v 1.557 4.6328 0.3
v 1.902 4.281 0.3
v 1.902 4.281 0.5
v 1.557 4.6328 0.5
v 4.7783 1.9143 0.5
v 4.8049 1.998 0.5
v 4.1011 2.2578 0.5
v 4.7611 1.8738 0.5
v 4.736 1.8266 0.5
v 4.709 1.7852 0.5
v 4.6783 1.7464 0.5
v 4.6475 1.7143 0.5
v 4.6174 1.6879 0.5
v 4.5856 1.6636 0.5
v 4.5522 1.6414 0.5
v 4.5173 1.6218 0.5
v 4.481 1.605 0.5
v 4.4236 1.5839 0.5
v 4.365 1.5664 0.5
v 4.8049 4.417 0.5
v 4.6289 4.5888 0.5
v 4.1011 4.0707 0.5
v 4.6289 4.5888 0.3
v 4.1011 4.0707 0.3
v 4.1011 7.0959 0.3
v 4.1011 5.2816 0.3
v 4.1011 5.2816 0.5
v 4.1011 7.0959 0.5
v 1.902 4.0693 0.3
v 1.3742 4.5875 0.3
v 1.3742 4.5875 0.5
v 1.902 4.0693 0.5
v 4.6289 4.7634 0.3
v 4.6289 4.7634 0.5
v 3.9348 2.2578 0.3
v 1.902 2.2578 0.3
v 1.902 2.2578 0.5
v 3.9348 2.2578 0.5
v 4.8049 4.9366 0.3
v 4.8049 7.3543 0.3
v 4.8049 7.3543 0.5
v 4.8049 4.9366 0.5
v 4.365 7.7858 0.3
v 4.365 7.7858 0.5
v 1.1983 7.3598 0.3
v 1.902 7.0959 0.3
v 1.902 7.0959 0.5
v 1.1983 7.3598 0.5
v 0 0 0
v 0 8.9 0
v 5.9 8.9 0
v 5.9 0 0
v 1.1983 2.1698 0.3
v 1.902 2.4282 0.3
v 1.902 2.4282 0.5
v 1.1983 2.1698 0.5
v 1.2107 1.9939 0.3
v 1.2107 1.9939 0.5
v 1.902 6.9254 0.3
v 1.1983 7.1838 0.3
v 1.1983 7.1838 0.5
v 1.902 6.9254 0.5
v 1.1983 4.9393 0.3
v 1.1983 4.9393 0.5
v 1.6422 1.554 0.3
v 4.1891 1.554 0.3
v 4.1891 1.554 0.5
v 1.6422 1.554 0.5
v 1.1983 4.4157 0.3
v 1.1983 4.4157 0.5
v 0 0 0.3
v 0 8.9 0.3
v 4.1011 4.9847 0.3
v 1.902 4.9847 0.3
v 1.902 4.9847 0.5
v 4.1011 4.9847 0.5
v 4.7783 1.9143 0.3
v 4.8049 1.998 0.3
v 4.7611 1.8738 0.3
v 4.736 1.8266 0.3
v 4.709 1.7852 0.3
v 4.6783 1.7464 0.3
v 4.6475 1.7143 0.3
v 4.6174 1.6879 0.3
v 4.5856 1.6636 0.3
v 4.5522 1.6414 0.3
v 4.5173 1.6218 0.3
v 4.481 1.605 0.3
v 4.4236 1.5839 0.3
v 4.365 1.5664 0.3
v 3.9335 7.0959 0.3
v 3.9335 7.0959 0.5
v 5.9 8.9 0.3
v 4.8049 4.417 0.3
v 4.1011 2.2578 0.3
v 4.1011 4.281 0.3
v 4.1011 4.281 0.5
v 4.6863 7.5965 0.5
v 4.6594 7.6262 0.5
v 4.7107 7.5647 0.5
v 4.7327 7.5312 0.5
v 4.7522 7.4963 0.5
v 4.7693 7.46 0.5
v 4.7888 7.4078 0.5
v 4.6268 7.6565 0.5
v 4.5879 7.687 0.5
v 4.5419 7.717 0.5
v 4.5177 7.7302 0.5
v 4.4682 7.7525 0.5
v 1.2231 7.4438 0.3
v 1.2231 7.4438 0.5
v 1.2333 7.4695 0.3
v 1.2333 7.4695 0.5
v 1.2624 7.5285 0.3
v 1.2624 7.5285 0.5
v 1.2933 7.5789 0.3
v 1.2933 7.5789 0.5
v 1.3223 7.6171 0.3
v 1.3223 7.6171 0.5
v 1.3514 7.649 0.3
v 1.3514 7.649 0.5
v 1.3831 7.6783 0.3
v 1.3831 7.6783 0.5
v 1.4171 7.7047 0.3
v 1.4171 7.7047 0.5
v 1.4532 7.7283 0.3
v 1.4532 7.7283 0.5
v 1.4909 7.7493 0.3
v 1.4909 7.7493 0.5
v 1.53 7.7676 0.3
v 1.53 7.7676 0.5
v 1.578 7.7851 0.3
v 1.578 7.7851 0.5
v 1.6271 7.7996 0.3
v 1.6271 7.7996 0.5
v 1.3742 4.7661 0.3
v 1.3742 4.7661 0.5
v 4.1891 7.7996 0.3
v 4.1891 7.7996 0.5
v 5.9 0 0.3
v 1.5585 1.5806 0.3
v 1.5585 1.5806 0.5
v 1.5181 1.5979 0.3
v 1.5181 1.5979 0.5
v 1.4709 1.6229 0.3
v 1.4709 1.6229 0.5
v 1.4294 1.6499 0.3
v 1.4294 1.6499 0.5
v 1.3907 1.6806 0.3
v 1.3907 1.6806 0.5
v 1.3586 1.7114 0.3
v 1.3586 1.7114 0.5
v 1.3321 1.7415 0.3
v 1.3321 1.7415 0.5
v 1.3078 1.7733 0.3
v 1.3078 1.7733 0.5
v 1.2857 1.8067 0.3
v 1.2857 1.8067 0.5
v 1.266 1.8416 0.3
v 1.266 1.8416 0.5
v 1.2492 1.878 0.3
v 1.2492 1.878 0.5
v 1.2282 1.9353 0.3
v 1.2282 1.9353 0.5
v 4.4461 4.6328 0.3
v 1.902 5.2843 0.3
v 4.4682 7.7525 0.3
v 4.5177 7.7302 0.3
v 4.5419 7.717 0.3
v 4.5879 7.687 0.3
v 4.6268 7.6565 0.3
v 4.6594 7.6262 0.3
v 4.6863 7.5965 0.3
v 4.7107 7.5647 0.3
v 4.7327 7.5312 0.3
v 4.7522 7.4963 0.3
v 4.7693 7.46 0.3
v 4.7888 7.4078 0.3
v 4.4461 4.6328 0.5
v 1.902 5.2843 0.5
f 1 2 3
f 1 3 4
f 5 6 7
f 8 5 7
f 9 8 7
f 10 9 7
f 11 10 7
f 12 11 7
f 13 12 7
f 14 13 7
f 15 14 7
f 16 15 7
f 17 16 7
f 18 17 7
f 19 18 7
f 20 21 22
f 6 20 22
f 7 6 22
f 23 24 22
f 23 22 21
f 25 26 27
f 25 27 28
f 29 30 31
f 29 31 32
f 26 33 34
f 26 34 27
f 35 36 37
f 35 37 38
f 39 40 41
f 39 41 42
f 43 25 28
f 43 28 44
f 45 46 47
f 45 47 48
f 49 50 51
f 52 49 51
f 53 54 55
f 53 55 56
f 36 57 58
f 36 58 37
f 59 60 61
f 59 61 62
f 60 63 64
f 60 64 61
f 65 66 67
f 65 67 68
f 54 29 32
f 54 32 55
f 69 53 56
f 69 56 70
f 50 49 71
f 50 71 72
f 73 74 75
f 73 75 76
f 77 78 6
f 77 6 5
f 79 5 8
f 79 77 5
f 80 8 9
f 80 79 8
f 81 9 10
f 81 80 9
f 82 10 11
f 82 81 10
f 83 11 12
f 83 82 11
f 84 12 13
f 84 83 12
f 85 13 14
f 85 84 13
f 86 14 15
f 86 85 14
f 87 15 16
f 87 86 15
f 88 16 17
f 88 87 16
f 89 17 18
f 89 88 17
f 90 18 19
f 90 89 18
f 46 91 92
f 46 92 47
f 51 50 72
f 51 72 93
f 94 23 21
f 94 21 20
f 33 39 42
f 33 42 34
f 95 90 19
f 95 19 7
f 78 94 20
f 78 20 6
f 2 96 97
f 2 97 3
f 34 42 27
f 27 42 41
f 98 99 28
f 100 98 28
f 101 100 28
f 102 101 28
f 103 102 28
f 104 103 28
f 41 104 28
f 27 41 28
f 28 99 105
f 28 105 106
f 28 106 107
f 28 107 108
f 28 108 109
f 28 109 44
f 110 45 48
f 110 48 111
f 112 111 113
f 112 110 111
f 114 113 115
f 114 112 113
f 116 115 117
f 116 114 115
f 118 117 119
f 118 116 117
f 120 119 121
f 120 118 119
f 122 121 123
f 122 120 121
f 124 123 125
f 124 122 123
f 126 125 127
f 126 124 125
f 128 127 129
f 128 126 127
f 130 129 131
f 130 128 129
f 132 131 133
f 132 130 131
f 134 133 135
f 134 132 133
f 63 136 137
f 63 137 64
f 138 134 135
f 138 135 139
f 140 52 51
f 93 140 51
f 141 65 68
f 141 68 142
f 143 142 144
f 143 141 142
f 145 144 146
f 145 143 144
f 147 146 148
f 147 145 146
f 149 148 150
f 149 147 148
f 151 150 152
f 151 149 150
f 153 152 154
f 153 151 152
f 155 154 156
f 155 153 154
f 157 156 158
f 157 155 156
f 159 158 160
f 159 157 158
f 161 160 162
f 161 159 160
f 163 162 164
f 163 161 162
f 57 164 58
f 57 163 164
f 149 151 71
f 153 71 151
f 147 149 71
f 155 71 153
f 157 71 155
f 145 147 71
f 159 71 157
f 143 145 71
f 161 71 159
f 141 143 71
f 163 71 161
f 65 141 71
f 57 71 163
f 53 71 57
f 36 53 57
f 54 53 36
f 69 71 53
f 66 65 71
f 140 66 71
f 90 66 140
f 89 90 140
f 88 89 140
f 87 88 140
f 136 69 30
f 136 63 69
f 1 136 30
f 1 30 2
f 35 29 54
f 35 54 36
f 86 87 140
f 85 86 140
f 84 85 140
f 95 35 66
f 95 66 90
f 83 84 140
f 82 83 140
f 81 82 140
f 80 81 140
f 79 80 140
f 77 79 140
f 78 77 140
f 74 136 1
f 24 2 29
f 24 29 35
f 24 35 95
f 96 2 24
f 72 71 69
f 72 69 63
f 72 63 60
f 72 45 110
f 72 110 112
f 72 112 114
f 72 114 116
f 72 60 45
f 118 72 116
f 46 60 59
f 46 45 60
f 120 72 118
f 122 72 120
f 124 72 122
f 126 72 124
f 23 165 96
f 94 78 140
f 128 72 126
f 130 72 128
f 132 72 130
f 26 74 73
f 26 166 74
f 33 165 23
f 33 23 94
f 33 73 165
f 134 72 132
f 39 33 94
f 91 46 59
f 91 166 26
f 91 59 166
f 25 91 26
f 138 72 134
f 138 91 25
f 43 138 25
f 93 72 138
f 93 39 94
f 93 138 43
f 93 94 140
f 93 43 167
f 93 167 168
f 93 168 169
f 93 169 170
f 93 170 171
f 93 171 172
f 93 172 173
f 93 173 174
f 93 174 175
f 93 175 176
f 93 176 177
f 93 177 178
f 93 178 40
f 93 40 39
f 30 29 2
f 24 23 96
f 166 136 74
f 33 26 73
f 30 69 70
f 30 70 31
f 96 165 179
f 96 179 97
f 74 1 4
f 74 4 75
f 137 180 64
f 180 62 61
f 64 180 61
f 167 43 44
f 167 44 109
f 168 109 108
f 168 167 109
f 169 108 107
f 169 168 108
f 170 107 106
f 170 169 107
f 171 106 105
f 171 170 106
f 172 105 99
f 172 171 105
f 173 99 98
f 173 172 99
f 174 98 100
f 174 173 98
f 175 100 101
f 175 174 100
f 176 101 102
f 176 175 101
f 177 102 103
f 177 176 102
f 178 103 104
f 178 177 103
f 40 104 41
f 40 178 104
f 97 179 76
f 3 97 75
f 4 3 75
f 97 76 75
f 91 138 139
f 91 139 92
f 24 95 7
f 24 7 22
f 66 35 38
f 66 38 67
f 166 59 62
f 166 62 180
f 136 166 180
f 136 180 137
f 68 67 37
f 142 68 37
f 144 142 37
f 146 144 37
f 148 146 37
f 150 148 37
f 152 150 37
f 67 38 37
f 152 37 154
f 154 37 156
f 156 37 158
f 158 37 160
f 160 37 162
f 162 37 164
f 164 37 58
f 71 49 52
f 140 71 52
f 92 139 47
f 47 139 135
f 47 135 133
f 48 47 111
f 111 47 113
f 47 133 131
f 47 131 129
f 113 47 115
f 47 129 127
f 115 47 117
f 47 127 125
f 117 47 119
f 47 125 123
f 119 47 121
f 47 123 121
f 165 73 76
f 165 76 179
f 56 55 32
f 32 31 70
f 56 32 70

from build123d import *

# Parameters (mm, degrees)
ESQUISSE1_W        = 5.9
ESQUISSE1_H        = 8.9
BOSS_EXTRU_1_DEPTH = 0.3
BOSS_EXTRU_2_DEPTH = 0.2


with BuildPart() as part:
    # Esquisse1 → Boss.-Extru.1 (new body)
    with BuildSketch(Plane.XY):
        with Locations((2.95, 4.45)):
            Rectangle(ESQUISSE1_W, ESQUISSE1_H)
    extrude(amount=BOSS_EXTRU_1_DEPTH)

    # Esquisse2 → Boss.-Extru.2 (add)
    with BuildSketch(Plane.XY.offset(0.3)):
        Polygon((4.101145441, 4.984687707), (4.446134619, 4.632826235), (4.101145441, 4.280964763), (1.902011242, 4.280964763), (1.557022065, 4.632826235), (1.902011242, 4.984687707), align=None)
        with BuildLine():
            Line((4.628937649, 4.588843551), (4.804868385, 4.417036191))
            Line((4.804868385, 4.417036191), (4.804868385, 1.997988572))
            add(Edge.make_bspline(
                [(4.804868385, 1.997988572), (4.796892021, 1.970242627), (4.781374023, 1.916262949), (4.746481224, 1.841368841), (4.703676592, 1.774599957), (4.652323935, 1.71605919), (4.592034601, 1.666365589), (4.524746962, 1.623048736), (4.447730355, 1.590283039), (4.393174294, 1.574531191), (4.365041545, 1.566408486)],
                knots=[0, 0, 0, 0, 8.6504e-05, 0.000168293, 0.000246829, 0.000323762, 0.000400842, 0.000480537, 0.000563016, 0.000650831, 0.000650831, 0.000650831, 0.000650831], degree=3))
            Line((4.365041545, 1.566408486), (4.101145441, 2.2577613))
            Line((4.101145441, 2.2577613), (4.101145441, 4.070672555))
            Line((4.101145441, 4.070672555), (4.628937649, 4.588843551))
        make_face()
        with BuildLine():
            Line((4.189110809, 1.554038356), (1.642238515, 1.554038356))
            add(Edge.make_bspline(
                [(1.642238515, 1.554038356), (1.614492569, 1.56201472), (1.560512892, 1.577532718), (1.485618783, 1.612425517), (1.4188499, 1.655230149), (1.360309132, 1.706582806), (1.310615531, 1.76687214), (1.267298679, 1.834159779), (1.234532982, 1.911176386), (1.218781133, 1.965732447), (1.210658428, 1.993865196)],
                knots=[0, 0, 0, 0, 8.6504e-05, 0.000168293, 0.000246829, 0.000323762, 0.000400842, 0.000480537, 0.000563016, 0.000650831, 0.000650831, 0.000650831, 0.000650831], degree=3))
            Line((1.210658428, 1.993865196), (1.902011242, 2.2577613))
            Line((1.902011242, 2.2577613), (3.934835917, 2.2577613))
            Line((3.934835917, 2.2577613), (4.189110809, 1.554038356))
        make_face()
        Polygon((1.198288298, 2.169795932), (1.198288298, 4.415661733), (1.374219034, 4.587469092), (1.902011242, 4.069298096), (1.902011242, 2.4281942), align=None)
        with BuildLine():
            Line((3.933461459, 7.095856538), (1.902011242, 7.095856538))
            Line((1.902011242, 7.095856538), (1.198288298, 7.359752642))
            add(Edge.make_bspline(
                [(1.198288298, 7.359752642), (1.205668701, 7.388002372), (1.220059896, 7.443087095), (1.255578594, 7.51864428), (1.296545483, 7.587210071), (1.346696322, 7.646951249), (1.40505091, 7.698450215), (1.471609716, 7.740797307), (1.545693252, 7.776412742), (1.599339408, 7.79167572), (1.627119467, 7.799579482)],
                knots=[0, 0, 0, 0, 8.7416e-05, 0.000170454, 0.000249423, 0.000326503, 0.000403436, 0.000481973, 0.000562516, 0.00064902, 0.00064902, 0.00064902, 0.00064902], degree=3))
            Line((1.627119467, 7.799579482), (4.189110809, 7.799579482))
            Line((4.189110809, 7.799579482), (3.933461459, 7.095856538))
        make_face()
        Polygon((1.902011242, 6.925423637), (1.902011242, 5.284319741), (1.374219034, 4.766148746), (1.198288298, 4.939330564), (1.198288298, 7.183821906), align=None)
        with BuildLine():
            Line((4.101145441, 5.281570824), (4.101145441, 7.095856538))
            Line((4.101145441, 7.095856538), (4.365041545, 7.785834893))
            add(Edge.make_bspline(
                [(4.365041545, 7.785834893), (4.393174294, 7.777712188), (4.447730355, 7.761960339), (4.524746962, 7.729194642), (4.592034601, 7.68587779), (4.652323935, 7.636184189), (4.703676592, 7.577643421), (4.746481224, 7.510874538), (4.781374023, 7.435980429), (4.796892021, 7.382000752), (4.804868385, 7.354254806)],
                knots=[0, 0, 0, 0, 8.7815e-05, 0.000170294, 0.000249989, 0.000327069, 0.000404002, 0.000482539, 0.000564328, 0.000650831, 0.000650831, 0.000650831, 0.000650831], degree=3))
            Line((4.804868385, 7.354254806), (4.804868385, 4.936581646))
            Line((4.804868385, 4.936581646), (4.628937649, 4.763399828))
            Line((4.628937649, 4.763399828), (4.101145441, 5.281570824))
        make_face()
    extrude(amount=BOSS_EXTRU_2_DEPTH)


solid = part.part
